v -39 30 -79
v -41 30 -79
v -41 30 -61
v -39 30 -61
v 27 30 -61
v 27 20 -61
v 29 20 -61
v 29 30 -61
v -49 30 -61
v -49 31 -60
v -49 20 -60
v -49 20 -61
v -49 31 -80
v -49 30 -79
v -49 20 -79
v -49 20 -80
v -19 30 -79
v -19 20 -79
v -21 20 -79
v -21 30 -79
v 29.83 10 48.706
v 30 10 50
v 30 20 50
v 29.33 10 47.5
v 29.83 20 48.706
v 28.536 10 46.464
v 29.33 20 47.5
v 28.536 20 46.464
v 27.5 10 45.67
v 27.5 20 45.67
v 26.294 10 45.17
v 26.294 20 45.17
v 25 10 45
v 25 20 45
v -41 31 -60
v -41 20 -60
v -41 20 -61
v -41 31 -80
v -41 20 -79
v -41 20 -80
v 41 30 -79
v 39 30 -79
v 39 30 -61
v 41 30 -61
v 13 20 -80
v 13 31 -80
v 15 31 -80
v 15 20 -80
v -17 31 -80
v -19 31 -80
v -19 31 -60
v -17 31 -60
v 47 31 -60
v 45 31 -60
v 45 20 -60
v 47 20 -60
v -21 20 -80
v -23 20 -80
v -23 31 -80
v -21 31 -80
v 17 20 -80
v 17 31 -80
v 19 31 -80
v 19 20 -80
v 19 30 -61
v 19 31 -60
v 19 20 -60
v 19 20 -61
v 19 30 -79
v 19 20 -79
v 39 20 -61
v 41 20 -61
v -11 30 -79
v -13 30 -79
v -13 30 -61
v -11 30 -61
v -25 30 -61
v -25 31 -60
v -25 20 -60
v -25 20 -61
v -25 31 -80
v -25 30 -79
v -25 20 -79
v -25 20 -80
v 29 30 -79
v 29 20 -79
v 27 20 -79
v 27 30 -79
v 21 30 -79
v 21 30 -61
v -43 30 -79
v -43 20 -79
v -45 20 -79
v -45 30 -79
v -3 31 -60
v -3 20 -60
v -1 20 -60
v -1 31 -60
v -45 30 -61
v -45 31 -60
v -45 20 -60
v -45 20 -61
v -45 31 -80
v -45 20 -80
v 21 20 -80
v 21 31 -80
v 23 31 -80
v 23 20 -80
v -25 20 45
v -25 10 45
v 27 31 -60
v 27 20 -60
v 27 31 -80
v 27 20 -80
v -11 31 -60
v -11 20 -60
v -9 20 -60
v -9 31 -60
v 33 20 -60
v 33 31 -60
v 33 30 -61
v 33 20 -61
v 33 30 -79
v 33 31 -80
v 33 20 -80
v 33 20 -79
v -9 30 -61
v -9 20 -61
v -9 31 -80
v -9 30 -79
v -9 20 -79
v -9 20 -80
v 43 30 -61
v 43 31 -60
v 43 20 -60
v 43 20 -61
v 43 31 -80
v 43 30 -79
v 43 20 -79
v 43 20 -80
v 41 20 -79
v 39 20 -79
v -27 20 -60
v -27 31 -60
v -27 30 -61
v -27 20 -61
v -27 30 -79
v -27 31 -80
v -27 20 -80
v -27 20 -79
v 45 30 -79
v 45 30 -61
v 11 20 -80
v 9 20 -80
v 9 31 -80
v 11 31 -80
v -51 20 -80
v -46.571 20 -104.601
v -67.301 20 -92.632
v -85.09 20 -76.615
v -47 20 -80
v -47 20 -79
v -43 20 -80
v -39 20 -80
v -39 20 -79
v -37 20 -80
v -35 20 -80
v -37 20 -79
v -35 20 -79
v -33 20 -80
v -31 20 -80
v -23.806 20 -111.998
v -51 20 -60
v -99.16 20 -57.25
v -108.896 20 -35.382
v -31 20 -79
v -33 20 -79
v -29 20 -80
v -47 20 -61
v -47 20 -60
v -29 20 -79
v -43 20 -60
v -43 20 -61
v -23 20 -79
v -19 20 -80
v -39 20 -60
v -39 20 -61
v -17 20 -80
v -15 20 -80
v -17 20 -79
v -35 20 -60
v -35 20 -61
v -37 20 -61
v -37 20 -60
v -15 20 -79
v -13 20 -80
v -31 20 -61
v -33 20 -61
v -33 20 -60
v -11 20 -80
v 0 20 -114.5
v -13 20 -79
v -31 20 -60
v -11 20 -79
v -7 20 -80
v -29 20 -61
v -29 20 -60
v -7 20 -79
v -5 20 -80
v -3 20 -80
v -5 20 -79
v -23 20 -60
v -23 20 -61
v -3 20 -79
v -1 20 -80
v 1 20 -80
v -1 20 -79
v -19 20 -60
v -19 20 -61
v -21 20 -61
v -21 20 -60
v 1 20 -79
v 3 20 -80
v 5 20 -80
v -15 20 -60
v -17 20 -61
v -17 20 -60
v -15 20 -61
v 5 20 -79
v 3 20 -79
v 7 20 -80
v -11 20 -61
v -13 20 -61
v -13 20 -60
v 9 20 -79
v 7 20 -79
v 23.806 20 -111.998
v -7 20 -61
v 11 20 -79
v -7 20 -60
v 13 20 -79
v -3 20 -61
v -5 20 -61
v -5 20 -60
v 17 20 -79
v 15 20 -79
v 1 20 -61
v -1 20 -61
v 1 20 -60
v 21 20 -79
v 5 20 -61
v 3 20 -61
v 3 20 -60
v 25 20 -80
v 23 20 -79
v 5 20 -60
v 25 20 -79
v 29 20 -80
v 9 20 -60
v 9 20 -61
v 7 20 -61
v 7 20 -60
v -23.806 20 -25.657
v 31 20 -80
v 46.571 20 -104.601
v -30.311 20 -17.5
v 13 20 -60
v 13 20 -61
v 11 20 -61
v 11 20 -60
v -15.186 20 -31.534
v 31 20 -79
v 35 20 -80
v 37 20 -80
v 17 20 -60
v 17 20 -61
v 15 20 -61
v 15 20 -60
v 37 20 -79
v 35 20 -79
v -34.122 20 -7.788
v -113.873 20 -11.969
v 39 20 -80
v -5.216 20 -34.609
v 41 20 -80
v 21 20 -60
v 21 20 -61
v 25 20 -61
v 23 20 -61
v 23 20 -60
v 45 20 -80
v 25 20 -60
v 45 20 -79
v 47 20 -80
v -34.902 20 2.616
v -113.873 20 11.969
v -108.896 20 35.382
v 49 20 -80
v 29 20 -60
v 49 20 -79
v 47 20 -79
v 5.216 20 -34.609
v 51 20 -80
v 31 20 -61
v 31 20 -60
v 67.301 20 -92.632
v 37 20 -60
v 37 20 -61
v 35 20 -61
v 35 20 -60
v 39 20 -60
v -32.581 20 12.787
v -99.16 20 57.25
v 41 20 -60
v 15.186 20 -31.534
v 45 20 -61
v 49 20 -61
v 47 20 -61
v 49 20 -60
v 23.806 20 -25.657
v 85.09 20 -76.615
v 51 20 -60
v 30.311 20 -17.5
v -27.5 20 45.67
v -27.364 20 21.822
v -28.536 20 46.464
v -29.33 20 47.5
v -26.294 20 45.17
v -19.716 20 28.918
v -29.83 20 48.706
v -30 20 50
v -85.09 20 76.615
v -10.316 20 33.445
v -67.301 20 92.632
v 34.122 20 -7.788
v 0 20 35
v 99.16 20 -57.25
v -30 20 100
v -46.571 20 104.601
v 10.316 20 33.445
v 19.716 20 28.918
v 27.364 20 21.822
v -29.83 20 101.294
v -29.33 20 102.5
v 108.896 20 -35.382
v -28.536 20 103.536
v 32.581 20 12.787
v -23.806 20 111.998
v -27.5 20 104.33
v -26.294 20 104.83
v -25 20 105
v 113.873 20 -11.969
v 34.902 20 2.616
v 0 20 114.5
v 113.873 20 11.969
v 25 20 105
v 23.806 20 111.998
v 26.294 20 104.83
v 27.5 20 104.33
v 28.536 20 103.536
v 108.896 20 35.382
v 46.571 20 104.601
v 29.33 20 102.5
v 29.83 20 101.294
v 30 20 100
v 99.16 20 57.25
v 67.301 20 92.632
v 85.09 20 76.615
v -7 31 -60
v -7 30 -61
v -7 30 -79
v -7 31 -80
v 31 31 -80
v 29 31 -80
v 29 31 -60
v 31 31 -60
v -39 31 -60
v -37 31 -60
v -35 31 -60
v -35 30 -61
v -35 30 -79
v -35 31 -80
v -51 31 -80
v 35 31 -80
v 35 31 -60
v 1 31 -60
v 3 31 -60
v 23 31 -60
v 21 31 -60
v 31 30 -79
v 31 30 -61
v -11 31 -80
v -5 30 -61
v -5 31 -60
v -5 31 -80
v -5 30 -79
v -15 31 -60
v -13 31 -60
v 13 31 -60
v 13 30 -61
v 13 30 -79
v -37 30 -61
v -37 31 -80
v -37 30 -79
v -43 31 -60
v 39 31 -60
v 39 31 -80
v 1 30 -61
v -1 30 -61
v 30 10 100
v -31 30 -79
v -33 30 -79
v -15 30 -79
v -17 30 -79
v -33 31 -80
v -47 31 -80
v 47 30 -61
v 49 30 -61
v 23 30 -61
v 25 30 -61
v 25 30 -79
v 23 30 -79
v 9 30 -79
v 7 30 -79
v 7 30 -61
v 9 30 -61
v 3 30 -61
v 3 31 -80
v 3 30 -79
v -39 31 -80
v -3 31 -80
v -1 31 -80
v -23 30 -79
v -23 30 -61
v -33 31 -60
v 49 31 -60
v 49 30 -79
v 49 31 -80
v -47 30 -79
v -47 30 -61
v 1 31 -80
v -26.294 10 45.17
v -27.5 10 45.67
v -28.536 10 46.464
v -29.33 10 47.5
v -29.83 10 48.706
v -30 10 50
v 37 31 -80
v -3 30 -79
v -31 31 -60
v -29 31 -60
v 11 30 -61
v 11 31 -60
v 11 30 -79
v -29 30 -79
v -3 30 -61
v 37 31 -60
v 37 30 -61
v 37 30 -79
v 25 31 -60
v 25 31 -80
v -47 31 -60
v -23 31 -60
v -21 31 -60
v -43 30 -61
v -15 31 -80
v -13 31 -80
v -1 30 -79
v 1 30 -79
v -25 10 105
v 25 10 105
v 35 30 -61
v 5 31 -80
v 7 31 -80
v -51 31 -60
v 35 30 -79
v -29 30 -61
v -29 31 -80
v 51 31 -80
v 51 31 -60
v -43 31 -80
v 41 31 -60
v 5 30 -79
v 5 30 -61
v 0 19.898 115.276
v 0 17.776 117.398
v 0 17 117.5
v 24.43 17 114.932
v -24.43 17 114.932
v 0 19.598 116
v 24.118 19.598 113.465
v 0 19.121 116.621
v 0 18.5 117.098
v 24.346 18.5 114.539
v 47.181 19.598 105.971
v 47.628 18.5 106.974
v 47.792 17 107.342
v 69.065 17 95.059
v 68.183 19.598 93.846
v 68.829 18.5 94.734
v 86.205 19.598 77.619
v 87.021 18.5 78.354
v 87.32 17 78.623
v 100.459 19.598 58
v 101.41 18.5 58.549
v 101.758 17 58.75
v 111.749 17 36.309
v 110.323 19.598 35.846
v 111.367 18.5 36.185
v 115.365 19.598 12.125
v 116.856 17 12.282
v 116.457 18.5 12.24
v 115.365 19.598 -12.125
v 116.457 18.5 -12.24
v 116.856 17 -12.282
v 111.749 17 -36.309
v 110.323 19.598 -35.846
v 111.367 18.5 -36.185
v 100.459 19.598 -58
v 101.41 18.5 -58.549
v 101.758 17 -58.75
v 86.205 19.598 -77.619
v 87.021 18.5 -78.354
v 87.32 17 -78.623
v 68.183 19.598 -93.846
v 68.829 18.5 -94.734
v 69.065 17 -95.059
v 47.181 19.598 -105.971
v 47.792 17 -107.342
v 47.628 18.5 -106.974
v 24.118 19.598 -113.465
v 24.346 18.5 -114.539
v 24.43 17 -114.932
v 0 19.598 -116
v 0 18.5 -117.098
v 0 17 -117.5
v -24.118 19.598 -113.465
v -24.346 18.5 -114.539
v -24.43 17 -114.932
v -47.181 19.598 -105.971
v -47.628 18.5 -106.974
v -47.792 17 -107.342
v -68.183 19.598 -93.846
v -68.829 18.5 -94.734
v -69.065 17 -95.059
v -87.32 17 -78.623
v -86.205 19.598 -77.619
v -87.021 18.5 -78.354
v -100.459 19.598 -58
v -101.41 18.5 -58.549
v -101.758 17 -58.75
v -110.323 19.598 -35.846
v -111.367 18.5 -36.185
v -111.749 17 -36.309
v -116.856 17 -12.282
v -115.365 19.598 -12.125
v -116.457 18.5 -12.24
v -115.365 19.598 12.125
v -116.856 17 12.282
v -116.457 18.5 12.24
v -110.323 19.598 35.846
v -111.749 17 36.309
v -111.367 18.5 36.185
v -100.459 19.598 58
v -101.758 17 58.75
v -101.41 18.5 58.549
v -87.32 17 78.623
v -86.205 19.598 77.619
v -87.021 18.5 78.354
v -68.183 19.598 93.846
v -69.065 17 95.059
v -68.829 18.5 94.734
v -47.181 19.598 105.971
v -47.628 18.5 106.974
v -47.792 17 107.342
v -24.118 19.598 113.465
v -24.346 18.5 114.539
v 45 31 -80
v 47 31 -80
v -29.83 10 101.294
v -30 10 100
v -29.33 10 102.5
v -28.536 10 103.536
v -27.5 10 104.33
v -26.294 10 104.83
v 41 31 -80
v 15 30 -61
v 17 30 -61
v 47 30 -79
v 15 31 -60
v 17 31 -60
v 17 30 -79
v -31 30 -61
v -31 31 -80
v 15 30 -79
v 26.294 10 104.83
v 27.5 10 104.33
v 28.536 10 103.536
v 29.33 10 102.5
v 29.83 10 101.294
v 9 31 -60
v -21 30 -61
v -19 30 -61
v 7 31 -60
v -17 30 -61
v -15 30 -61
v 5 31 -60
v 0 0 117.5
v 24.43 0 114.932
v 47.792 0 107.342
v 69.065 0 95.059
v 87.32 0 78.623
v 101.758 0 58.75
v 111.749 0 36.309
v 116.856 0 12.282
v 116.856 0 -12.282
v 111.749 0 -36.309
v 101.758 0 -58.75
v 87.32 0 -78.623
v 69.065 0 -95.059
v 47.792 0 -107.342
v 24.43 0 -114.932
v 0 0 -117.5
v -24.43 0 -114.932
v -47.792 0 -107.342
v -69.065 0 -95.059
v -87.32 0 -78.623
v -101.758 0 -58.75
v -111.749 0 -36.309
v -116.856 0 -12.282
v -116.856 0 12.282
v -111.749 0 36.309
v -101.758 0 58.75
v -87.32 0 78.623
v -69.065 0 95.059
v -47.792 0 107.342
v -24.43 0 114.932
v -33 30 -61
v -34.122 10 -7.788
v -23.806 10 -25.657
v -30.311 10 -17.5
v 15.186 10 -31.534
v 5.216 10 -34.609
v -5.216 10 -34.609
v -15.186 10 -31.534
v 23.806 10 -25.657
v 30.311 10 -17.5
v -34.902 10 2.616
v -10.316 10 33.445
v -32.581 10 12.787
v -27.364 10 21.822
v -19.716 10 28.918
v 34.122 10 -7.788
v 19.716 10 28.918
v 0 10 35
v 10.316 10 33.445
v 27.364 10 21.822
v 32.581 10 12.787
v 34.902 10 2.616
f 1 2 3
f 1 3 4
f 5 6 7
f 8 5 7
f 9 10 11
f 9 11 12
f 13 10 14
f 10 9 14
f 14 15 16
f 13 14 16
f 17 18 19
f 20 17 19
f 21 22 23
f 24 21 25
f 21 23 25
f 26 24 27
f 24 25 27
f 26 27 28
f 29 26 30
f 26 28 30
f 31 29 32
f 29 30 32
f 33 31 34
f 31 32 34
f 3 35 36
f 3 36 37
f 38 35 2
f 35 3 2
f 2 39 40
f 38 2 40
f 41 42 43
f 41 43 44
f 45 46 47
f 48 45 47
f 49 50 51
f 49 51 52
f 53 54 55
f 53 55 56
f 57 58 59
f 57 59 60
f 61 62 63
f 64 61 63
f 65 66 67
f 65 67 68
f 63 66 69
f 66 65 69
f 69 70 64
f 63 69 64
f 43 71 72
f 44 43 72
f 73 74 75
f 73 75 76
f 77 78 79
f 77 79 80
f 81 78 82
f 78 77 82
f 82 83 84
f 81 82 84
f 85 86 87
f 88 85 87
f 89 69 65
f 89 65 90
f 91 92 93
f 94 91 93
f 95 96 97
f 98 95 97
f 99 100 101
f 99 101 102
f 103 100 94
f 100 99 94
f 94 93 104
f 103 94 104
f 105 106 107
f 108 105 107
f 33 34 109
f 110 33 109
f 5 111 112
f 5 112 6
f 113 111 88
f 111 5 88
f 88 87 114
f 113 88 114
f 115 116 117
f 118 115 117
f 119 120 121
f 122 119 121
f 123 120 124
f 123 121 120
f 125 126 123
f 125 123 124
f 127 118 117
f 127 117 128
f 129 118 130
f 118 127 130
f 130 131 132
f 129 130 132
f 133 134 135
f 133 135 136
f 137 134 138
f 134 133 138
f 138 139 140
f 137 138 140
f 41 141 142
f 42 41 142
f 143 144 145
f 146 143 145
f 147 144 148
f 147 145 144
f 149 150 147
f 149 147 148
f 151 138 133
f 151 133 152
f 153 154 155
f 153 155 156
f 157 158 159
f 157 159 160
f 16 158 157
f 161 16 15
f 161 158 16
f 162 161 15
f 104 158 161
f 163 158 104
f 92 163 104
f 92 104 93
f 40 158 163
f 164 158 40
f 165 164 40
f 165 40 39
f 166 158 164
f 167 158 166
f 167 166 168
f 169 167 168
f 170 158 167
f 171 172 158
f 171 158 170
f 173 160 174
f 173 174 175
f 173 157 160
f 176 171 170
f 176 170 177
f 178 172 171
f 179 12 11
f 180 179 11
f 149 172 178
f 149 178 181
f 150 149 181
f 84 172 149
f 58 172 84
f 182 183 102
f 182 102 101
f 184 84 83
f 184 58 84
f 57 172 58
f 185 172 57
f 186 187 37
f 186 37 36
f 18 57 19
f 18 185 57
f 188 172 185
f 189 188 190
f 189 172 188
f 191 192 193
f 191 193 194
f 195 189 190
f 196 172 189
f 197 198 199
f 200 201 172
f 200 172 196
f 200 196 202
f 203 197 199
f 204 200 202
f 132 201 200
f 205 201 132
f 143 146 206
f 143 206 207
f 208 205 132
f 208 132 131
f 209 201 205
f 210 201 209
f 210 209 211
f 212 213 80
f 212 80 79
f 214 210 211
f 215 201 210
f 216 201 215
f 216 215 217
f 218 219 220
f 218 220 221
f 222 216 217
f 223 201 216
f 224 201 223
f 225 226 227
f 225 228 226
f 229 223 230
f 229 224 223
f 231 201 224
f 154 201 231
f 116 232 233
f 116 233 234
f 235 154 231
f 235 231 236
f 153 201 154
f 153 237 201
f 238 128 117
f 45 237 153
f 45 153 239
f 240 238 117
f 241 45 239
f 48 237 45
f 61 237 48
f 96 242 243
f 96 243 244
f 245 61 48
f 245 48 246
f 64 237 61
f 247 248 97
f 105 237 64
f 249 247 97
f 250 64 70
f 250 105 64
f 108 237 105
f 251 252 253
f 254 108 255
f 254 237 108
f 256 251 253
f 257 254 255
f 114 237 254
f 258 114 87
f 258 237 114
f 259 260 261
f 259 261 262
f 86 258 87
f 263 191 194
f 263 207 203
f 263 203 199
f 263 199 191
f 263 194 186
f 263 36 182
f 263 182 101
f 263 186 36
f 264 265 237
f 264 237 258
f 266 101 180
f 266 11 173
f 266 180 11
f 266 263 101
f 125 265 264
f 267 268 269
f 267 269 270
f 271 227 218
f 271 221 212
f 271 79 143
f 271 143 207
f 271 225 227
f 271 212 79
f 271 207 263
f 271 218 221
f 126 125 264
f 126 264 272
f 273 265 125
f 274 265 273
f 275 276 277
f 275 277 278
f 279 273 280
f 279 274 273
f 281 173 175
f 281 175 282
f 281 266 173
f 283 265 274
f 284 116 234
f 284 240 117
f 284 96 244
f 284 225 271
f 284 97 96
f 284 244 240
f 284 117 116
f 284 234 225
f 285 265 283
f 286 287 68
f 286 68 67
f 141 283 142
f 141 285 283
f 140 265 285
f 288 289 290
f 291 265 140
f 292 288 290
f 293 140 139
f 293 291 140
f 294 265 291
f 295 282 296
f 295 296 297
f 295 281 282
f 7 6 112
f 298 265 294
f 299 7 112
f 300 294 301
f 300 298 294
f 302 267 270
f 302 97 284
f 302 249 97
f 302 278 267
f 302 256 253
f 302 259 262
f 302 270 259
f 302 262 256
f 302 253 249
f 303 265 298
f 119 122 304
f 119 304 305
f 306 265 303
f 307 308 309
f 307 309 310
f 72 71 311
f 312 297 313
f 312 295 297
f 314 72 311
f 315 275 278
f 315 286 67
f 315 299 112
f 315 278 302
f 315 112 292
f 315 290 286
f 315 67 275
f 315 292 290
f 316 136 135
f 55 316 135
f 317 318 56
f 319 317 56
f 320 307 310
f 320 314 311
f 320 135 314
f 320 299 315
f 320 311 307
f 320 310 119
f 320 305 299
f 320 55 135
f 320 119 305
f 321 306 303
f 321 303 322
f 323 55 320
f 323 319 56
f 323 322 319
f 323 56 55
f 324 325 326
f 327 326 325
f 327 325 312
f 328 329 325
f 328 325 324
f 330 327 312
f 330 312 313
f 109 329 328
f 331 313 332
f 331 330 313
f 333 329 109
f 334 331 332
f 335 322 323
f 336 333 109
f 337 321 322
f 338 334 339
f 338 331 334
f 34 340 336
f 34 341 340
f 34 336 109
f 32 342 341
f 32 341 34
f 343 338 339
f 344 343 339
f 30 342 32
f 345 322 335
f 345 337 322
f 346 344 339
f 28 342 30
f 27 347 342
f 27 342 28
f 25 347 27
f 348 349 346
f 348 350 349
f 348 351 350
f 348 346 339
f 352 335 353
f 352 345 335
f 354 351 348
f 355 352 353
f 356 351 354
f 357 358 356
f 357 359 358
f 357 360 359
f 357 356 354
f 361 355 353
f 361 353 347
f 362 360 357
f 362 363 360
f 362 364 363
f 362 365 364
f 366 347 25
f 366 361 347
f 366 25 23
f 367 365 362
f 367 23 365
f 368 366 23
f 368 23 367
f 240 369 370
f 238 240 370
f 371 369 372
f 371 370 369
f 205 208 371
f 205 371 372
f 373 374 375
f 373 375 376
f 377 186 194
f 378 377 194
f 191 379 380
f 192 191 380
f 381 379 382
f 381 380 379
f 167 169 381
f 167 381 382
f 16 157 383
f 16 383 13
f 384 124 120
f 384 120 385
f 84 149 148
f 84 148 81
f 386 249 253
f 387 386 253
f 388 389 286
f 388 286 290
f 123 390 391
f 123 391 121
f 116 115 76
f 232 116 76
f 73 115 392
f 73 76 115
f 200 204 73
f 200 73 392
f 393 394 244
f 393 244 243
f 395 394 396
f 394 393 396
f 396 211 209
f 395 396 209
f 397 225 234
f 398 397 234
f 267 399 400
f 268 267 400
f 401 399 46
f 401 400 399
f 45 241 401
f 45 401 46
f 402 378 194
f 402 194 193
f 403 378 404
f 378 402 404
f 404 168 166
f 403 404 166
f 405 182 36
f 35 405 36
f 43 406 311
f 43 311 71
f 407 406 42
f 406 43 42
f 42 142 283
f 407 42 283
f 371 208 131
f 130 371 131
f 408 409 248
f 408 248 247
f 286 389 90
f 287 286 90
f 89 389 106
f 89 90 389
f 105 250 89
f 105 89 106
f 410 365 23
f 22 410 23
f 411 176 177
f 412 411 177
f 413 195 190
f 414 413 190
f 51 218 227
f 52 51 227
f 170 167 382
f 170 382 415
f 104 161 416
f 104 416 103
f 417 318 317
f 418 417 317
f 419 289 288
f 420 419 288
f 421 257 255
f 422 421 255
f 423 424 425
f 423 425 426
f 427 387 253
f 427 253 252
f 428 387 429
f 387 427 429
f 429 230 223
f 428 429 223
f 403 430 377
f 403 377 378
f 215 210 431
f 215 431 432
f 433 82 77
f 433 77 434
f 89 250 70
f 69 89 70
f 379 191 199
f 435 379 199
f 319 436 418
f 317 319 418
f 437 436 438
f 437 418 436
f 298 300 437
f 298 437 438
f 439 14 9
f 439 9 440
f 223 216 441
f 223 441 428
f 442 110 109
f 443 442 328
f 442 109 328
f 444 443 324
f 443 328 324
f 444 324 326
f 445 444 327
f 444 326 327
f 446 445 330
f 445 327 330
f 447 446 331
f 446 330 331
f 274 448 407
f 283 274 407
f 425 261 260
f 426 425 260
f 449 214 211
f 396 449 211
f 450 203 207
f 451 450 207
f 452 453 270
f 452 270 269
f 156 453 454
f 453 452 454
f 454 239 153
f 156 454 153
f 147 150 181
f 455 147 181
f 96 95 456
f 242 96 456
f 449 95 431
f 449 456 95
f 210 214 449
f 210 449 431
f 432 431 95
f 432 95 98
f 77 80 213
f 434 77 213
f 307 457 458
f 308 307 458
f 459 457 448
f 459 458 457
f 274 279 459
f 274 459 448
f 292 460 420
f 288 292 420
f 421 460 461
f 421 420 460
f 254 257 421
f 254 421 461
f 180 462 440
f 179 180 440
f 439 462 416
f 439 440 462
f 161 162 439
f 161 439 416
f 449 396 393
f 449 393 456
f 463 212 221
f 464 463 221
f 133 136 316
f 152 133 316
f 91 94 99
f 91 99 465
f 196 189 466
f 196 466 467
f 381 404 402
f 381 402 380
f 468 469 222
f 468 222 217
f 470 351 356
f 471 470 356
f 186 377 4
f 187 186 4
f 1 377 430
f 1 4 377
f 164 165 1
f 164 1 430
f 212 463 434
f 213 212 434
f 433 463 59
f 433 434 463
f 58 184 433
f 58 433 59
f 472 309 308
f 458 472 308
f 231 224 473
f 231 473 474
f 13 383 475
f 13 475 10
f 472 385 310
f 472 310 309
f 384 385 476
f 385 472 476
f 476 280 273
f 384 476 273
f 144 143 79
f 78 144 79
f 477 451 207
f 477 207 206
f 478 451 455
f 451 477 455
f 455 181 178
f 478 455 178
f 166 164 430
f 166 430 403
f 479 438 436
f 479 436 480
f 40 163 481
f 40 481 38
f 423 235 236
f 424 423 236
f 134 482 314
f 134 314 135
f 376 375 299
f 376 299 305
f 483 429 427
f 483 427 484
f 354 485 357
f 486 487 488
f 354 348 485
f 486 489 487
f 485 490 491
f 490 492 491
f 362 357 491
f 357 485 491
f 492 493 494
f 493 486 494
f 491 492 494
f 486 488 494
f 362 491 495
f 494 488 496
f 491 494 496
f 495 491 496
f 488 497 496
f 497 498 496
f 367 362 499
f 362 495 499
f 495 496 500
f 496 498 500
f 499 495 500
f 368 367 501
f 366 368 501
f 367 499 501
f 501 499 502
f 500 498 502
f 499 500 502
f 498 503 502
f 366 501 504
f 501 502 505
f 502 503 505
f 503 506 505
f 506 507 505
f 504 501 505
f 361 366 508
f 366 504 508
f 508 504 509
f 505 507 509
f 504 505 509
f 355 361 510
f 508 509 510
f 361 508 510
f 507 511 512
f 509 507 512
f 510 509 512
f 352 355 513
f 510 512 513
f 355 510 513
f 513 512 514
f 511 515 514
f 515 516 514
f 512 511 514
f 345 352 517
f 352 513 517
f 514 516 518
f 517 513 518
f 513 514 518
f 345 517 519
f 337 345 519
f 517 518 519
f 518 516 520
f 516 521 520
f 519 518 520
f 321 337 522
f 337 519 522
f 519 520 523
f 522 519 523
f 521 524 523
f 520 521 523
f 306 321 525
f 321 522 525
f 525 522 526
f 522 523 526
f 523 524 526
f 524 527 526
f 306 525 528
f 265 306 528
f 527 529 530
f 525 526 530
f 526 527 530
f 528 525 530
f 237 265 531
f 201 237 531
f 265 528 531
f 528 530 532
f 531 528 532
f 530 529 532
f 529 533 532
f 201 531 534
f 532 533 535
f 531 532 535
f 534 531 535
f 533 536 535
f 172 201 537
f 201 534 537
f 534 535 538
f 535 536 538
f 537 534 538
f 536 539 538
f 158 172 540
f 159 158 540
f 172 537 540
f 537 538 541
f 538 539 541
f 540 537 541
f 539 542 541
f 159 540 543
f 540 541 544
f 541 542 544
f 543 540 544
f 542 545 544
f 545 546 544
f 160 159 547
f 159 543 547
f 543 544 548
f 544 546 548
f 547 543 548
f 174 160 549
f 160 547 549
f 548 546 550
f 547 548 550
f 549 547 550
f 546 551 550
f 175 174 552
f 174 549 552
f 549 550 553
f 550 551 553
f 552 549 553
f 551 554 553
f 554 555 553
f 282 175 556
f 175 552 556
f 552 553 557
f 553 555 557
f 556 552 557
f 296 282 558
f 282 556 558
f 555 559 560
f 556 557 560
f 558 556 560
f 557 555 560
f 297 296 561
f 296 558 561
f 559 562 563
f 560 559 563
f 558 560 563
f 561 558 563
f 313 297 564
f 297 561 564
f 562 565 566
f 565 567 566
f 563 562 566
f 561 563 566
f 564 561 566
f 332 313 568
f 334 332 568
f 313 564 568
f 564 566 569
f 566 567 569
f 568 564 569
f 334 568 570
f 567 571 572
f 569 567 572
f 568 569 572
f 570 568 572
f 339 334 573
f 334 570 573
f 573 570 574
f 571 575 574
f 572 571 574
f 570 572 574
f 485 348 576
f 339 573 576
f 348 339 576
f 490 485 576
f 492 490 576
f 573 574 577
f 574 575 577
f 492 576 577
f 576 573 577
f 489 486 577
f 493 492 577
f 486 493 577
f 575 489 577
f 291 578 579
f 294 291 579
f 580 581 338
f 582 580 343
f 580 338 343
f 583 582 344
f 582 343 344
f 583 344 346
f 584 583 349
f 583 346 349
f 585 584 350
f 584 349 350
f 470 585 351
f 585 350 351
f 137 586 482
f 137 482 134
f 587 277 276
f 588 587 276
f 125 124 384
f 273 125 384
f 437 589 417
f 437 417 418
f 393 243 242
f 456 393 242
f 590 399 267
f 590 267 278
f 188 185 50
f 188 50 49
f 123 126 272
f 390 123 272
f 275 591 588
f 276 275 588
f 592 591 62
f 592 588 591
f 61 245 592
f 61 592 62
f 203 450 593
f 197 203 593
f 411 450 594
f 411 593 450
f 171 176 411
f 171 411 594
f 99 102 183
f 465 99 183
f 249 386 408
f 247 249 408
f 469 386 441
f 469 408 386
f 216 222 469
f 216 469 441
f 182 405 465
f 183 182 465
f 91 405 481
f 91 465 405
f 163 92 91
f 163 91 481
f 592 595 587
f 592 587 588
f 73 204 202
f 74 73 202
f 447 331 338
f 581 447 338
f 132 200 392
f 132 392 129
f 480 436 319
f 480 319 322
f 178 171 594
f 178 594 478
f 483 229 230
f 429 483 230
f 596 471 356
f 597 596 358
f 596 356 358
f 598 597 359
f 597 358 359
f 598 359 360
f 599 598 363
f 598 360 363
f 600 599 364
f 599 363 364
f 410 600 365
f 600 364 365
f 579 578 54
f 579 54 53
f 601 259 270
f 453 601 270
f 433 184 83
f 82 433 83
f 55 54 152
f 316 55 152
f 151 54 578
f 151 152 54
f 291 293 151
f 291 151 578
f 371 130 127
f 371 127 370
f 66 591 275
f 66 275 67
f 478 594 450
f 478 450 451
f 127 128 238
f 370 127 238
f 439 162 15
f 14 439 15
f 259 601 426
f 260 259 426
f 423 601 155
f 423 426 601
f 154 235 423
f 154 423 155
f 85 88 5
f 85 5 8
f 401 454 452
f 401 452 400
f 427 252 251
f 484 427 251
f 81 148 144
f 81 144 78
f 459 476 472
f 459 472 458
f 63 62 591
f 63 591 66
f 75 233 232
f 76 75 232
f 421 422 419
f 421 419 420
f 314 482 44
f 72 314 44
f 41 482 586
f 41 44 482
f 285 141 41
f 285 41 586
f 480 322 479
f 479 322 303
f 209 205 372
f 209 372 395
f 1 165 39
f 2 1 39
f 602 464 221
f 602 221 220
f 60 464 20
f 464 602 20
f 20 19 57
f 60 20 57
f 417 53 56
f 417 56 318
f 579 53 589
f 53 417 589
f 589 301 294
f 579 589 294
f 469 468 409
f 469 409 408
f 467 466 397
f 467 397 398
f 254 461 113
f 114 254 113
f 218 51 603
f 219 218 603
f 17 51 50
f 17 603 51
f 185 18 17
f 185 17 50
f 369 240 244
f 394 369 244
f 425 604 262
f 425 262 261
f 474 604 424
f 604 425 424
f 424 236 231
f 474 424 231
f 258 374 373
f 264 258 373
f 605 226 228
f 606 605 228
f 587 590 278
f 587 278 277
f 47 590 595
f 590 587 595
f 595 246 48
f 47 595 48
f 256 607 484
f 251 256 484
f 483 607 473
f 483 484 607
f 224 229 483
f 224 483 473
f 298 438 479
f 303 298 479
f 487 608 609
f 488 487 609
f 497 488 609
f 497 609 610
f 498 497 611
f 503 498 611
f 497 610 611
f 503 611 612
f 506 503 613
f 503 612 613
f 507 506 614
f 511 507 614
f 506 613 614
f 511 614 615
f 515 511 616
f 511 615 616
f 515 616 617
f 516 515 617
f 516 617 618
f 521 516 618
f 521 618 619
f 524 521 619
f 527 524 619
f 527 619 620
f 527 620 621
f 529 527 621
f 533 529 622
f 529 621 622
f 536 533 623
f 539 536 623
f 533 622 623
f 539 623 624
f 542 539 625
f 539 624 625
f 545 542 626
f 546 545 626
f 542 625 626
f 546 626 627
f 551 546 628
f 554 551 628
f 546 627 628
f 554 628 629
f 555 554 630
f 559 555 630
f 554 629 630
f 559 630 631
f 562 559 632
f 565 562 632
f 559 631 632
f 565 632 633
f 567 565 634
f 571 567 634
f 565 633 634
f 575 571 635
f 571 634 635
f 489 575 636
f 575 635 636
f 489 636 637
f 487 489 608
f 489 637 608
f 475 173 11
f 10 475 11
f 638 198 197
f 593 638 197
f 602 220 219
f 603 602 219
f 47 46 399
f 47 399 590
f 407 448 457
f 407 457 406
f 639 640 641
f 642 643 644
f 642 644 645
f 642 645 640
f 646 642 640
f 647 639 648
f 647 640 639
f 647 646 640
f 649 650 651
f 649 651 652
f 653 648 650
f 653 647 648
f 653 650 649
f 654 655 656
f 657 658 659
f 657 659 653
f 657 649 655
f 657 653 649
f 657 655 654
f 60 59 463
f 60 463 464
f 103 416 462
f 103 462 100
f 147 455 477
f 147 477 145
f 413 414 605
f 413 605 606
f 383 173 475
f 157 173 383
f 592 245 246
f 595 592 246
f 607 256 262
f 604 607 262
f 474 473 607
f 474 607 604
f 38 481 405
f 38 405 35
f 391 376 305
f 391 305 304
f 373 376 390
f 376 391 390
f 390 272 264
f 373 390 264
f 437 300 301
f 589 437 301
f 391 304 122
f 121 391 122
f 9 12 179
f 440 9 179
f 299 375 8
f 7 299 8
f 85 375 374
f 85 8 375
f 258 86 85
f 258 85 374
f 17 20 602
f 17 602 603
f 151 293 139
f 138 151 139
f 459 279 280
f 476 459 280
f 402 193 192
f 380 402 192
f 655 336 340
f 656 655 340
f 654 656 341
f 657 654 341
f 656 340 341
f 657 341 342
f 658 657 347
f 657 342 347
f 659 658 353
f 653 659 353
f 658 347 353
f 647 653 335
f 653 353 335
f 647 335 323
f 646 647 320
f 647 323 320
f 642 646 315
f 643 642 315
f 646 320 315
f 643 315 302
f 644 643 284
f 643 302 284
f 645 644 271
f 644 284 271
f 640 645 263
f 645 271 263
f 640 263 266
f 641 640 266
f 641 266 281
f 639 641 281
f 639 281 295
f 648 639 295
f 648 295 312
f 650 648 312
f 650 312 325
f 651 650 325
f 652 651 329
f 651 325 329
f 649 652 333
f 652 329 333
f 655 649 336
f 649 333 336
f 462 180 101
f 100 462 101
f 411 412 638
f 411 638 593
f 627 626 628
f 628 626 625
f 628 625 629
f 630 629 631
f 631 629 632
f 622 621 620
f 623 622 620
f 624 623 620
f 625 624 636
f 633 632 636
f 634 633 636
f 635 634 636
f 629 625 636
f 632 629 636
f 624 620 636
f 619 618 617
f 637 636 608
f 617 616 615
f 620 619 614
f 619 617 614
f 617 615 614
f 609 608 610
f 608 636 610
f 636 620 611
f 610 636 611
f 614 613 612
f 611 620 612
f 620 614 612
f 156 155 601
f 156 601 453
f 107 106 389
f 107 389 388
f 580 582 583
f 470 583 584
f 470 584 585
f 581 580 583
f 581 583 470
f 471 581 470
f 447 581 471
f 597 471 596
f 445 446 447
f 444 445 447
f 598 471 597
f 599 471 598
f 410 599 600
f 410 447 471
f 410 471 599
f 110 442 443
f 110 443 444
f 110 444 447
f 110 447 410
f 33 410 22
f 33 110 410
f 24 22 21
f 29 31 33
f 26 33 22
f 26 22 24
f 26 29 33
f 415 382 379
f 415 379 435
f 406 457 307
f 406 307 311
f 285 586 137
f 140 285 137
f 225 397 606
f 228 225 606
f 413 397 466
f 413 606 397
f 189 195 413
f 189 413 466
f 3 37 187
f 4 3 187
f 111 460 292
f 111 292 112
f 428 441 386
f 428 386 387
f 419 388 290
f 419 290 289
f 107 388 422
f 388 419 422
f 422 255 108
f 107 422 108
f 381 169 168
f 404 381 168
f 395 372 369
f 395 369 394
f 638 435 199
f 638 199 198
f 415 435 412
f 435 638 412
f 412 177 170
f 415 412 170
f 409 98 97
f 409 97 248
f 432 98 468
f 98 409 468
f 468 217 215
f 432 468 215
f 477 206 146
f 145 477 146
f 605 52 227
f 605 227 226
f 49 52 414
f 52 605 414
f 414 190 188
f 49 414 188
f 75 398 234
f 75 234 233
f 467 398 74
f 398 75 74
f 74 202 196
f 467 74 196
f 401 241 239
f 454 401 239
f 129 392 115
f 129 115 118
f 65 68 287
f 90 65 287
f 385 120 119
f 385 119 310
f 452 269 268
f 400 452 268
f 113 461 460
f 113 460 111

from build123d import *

# Parameters (mm, degrees)
SKETCH1_R           = 117.5
BOSS_EXTRUDE1_DEPTH = 20
SKETCH2_R           = 35
CUT_EXTRUDE1_DEPTH  = 10
SKETCH3_W           = 102
SKETCH3_H           = 20
BOSS_EXTRUDE2_DEPTH = 10
SKETCH6_W           = 2
SKETCH6_H           = 20
BOSS_EXTRUDE3_DEPTH = 1
SKETCH7_W           = 2
SKETCH7_H           = 10
CUT_EXTRUDE2_DEPTH  = 1
SKETCH8_W           = 2
SKETCH8_H           = 10
CUT_EXTRUDE3_DEPTH  = 1
FILLET3_R           = 3


with BuildPart() as part:
    # Sketch1 → Boss-Extrude1 (new body)
    with BuildSketch(Plane(origin=(0, 0, 0), x_dir=(1, 0, 0), z_dir=(0, 1, 0))):
        with Locations(Location((0, 0, 0), (0, 0, 270))):
            Circle(SKETCH1_R)
    extrude(amount=BOSS_EXTRUDE1_DEPTH)

    # Sketch2 → Cut-Extrude1 (cut)
    with BuildSketch(Plane(origin=(0, 20, 0), x_dir=(1, 0, 0), z_dir=(0, 1, 0))):
        with Locations(Location((0, 0, 0), (0, 0, 270))):
            Circle(SKETCH2_R)
        with BuildLine():
            Line((-25, -105), (25, -105))
            ThreePointArc((25, -105), (28.535533906, -103.535533906), (30, -100))
            Line((30, -100), (30, -50))
            ThreePointArc((30, -50), (28.535533906, -46.464466094), (25, -45))
            Line((25, -45), (-25, -45))
            ThreePointArc((-25, -45), (-28.535533906, -46.464466094), (-30, -50))
            Line((-30, -50), (-30, -100))
            ThreePointArc((-30, -100), (-28.535533906, -103.535533906), (-25, -105))
        make_face()
    extrude(amount=-CUT_EXTRUDE1_DEPTH, mode=Mode.SUBTRACT)

    # Sketch3 → Boss-Extrude2 (add)
    with BuildSketch(Plane(origin=(0, 20, 0), x_dir=(1, 0, 0), z_dir=(0, 1, 0))):
        with Locations((0, 70)):
            Rectangle(SKETCH3_W, SKETCH3_H)
    extrude(amount=BOSS_EXTRUDE2_DEPTH)

    # Sketch6 → Boss-Extrude3 (add)
    with BuildSketch(Plane(origin=(0, 30, 0), x_dir=(1, 0, 0), z_dir=(0, 1, 0))):
        with Locations((-50, 70)):
            Rectangle(SKETCH6_W, SKETCH6_H)
        with Locations((-46, 70)):
            Rectangle(SKETCH6_W, SKETCH6_H)
        with Locations((-42, 70)):
            Rectangle(SKETCH6_W, SKETCH6_H)
        with Locations((-38, 70)):
            Rectangle(SKETCH6_W, SKETCH6_H)
        with Locations((-34, 70)):
            Rectangle(SKETCH6_W, SKETCH6_H)
        with Locations((-30, 70)):
            Rectangle(SKETCH6_W, SKETCH6_H)
        with Locations((-26, 70)):
            Rectangle(SKETCH6_W, SKETCH6_H)
        with Locations((-22, 70)):
            Rectangle(SKETCH6_W, SKETCH6_H)
        with Locations((-18, 70)):
            Rectangle(SKETCH6_W, SKETCH6_H)
        with Locations((-14, 70)):
            Rectangle(SKETCH6_W, SKETCH6_H)
        with Locations((-10, 70)):
            Rectangle(SKETCH6_W, SKETCH6_H)
        with Locations((-6, 70)):
            Rectangle(SKETCH6_W, SKETCH6_H)
        with Locations((-2, 70)):
            Rectangle(SKETCH6_W, SKETCH6_H)
        with Locations((2, 70)):
            Rectangle(SKETCH6_W, SKETCH6_H)
        with Locations((6, 70)):
            Rectangle(SKETCH6_W, SKETCH6_H)
        with Locations((10, 70)):
            Rectangle(SKETCH6_W, SKETCH6_H)
        with Locations((14, 70)):
            Rectangle(SKETCH6_W, SKETCH6_H)
        with Locations((18, 70)):
            Rectangle(SKETCH6_W, SKETCH6_H)
        with Locations((22, 70)):
            Rectangle(SKETCH6_W, SKETCH6_H)
        with Locations((26, 70)):
            Rectangle(SKETCH6_W, SKETCH6_H)
        with Locations((30, 70)):
            Rectangle(SKETCH6_W, SKETCH6_H)
        with Locations((34, 70)):
            Rectangle(SKETCH6_W, SKETCH6_H)
        with Locations((38, 70)):
            Rectangle(SKETCH6_W, SKETCH6_H)
        with Locations((42, 70)):
            Rectangle(SKETCH6_W, SKETCH6_H)
        with Locations((46, 70)):
            Rectangle(SKETCH6_W, SKETCH6_H)
        with Locations((50, 70)):
            Rectangle(SKETCH6_W, SKETCH6_H)
    extrude(amount=BOSS_EXTRUDE3_DEPTH)

    # Sketch7 → Cut-Extrude2 (cut)
    with BuildSketch(Plane.XY.offset(-60)):
        with Locations((-48, 25)):
            Rectangle(SKETCH7_W, SKETCH7_H)
        with Locations((-44, 25)):
            Rectangle(SKETCH7_W, SKETCH7_H)
        with Locations((-40, 25)):
            Rectangle(SKETCH7_W, SKETCH7_H)
        with Locations((-36, 25)):
            Rectangle(SKETCH7_W, SKETCH7_H)
        with Locations((-32, 25)):
            Rectangle(SKETCH7_W, SKETCH7_H)
        with Locations((-28, 25)):
            Rectangle(SKETCH7_W, SKETCH7_H)
        with Locations((-24, 25)):
            Rectangle(SKETCH7_W, SKETCH7_H)
        with Locations((-20, 25)):
            Rectangle(SKETCH7_W, SKETCH7_H)
        with Locations((-16, 25)):
            Rectangle(SKETCH7_W, SKETCH7_H)
        with Locations((-12, 25)):
            Rectangle(SKETCH7_W, SKETCH7_H)
        with Locations((-8, 25)):
            Rectangle(SKETCH7_W, SKETCH7_H)
        with Locations((-4, 25)):
            Rectangle(SKETCH7_W, SKETCH7_H)
        with Locations((0, 25)):
            Rectangle(SKETCH7_W, SKETCH7_H)
        with Locations((4, 25)):
            Rectangle(SKETCH7_W, SKETCH7_H)
        with Locations((8, 25)):
            Rectangle(SKETCH7_W, SKETCH7_H)
        with Locations((12, 25)):
            Rectangle(SKETCH7_W, SKETCH7_H)
        with Locations((16, 25)):
            Rectangle(SKETCH7_W, SKETCH7_H)
        with Locations((20, 25)):
            Rectangle(SKETCH7_W, SKETCH7_H)
        with Locations((24, 25)):
            Rectangle(SKETCH7_W, SKETCH7_H)
        with Locations((28, 25)):
            Rectangle(SKETCH7_W, SKETCH7_H)
        with Locations((32, 25)):
            Rectangle(SKETCH7_W, SKETCH7_H)
        with Locations((36, 25)):
            Rectangle(SKETCH7_W, SKETCH7_H)
        with Locations((40, 25)):
            Rectangle(SKETCH7_W, SKETCH7_H)
        with Locations((44, 25)):
            Rectangle(SKETCH7_W, SKETCH7_H)
        with Locations((48, 25)):
            Rectangle(SKETCH7_W, SKETCH7_H)
    extrude(amount=-CUT_EXTRUDE2_DEPTH, mode=Mode.SUBTRACT)

    # Sketch8 → Cut-Extrude3 (cut)
    with BuildSketch(Plane(origin=(0, 0, -80), x_dir=(-1, 0, 0), z_dir=(0, 0, -1))):
        with Locations((-48, 25)):
            Rectangle(SKETCH8_W, SKETCH8_H)
        with Locations((-44, 25)):
            Rectangle(SKETCH8_W, SKETCH8_H)
        with Locations((-40, 25)):
            Rectangle(SKETCH8_W, SKETCH8_H)
        with Locations((-36, 25)):
            Rectangle(SKETCH8_W, SKETCH8_H)
        with Locations((-32, 25)):
            Rectangle(SKETCH8_W, SKETCH8_H)
        with Locations((-28, 25)):
            Rectangle(SKETCH8_W, SKETCH8_H)
        with Locations((-24, 25)):
            Rectangle(SKETCH8_W, SKETCH8_H)
        with Locations((-20, 25)):
            Rectangle(SKETCH8_W, SKETCH8_H)
        with Locations((-16, 25)):
            Rectangle(SKETCH8_W, SKETCH8_H)
        with Locations((-12, 25)):
            Rectangle(SKETCH8_W, SKETCH8_H)
        with Locations((-8, 25)):
            Rectangle(SKETCH8_W, SKETCH8_H)
        with Locations((-4, 25)):
            Rectangle(SKETCH8_W, SKETCH8_H)
        with Locations((0, 25)):
            Rectangle(SKETCH8_W, SKETCH8_H)
        with Locations((4, 25)):
            Rectangle(SKETCH8_W, SKETCH8_H)
        with Locations((8, 25)):
            Rectangle(SKETCH8_W, SKETCH8_H)
        with Locations((12, 25)):
            Rectangle(SKETCH8_W, SKETCH8_H)
        with Locations((16, 25)):
            Rectangle(SKETCH8_W, SKETCH8_H)
        with Locations((20, 25)):
            Rectangle(SKETCH8_W, SKETCH8_H)
        with Locations((24, 25)):
            Rectangle(SKETCH8_W, SKETCH8_H)
        with Locations((28, 25)):
            Rectangle(SKETCH8_W, SKETCH8_H)
        with Locations((32, 25)):
            Rectangle(SKETCH8_W, SKETCH8_H)
        with Locations((36, 25)):
            Rectangle(SKETCH8_W, SKETCH8_H)
        with Locations((40, 25)):
            Rectangle(SKETCH8_W, SKETCH8_H)
        with Locations((44, 25)):
            Rectangle(SKETCH8_W, SKETCH8_H)
        with Locations((48, 25)):
            Rectangle(SKETCH8_W, SKETCH8_H)
    extrude(amount=-CUT_EXTRUDE3_DEPTH, mode=Mode.SUBTRACT)

    # Fillet3
    fillet3_edges = [part.edges().sort_by_distance(p)[0] for p in [
        (0, 20, -117.5),
    ]]
    fillet(fillet3_edges, radius=FILLET3_R)


solid = part.part
